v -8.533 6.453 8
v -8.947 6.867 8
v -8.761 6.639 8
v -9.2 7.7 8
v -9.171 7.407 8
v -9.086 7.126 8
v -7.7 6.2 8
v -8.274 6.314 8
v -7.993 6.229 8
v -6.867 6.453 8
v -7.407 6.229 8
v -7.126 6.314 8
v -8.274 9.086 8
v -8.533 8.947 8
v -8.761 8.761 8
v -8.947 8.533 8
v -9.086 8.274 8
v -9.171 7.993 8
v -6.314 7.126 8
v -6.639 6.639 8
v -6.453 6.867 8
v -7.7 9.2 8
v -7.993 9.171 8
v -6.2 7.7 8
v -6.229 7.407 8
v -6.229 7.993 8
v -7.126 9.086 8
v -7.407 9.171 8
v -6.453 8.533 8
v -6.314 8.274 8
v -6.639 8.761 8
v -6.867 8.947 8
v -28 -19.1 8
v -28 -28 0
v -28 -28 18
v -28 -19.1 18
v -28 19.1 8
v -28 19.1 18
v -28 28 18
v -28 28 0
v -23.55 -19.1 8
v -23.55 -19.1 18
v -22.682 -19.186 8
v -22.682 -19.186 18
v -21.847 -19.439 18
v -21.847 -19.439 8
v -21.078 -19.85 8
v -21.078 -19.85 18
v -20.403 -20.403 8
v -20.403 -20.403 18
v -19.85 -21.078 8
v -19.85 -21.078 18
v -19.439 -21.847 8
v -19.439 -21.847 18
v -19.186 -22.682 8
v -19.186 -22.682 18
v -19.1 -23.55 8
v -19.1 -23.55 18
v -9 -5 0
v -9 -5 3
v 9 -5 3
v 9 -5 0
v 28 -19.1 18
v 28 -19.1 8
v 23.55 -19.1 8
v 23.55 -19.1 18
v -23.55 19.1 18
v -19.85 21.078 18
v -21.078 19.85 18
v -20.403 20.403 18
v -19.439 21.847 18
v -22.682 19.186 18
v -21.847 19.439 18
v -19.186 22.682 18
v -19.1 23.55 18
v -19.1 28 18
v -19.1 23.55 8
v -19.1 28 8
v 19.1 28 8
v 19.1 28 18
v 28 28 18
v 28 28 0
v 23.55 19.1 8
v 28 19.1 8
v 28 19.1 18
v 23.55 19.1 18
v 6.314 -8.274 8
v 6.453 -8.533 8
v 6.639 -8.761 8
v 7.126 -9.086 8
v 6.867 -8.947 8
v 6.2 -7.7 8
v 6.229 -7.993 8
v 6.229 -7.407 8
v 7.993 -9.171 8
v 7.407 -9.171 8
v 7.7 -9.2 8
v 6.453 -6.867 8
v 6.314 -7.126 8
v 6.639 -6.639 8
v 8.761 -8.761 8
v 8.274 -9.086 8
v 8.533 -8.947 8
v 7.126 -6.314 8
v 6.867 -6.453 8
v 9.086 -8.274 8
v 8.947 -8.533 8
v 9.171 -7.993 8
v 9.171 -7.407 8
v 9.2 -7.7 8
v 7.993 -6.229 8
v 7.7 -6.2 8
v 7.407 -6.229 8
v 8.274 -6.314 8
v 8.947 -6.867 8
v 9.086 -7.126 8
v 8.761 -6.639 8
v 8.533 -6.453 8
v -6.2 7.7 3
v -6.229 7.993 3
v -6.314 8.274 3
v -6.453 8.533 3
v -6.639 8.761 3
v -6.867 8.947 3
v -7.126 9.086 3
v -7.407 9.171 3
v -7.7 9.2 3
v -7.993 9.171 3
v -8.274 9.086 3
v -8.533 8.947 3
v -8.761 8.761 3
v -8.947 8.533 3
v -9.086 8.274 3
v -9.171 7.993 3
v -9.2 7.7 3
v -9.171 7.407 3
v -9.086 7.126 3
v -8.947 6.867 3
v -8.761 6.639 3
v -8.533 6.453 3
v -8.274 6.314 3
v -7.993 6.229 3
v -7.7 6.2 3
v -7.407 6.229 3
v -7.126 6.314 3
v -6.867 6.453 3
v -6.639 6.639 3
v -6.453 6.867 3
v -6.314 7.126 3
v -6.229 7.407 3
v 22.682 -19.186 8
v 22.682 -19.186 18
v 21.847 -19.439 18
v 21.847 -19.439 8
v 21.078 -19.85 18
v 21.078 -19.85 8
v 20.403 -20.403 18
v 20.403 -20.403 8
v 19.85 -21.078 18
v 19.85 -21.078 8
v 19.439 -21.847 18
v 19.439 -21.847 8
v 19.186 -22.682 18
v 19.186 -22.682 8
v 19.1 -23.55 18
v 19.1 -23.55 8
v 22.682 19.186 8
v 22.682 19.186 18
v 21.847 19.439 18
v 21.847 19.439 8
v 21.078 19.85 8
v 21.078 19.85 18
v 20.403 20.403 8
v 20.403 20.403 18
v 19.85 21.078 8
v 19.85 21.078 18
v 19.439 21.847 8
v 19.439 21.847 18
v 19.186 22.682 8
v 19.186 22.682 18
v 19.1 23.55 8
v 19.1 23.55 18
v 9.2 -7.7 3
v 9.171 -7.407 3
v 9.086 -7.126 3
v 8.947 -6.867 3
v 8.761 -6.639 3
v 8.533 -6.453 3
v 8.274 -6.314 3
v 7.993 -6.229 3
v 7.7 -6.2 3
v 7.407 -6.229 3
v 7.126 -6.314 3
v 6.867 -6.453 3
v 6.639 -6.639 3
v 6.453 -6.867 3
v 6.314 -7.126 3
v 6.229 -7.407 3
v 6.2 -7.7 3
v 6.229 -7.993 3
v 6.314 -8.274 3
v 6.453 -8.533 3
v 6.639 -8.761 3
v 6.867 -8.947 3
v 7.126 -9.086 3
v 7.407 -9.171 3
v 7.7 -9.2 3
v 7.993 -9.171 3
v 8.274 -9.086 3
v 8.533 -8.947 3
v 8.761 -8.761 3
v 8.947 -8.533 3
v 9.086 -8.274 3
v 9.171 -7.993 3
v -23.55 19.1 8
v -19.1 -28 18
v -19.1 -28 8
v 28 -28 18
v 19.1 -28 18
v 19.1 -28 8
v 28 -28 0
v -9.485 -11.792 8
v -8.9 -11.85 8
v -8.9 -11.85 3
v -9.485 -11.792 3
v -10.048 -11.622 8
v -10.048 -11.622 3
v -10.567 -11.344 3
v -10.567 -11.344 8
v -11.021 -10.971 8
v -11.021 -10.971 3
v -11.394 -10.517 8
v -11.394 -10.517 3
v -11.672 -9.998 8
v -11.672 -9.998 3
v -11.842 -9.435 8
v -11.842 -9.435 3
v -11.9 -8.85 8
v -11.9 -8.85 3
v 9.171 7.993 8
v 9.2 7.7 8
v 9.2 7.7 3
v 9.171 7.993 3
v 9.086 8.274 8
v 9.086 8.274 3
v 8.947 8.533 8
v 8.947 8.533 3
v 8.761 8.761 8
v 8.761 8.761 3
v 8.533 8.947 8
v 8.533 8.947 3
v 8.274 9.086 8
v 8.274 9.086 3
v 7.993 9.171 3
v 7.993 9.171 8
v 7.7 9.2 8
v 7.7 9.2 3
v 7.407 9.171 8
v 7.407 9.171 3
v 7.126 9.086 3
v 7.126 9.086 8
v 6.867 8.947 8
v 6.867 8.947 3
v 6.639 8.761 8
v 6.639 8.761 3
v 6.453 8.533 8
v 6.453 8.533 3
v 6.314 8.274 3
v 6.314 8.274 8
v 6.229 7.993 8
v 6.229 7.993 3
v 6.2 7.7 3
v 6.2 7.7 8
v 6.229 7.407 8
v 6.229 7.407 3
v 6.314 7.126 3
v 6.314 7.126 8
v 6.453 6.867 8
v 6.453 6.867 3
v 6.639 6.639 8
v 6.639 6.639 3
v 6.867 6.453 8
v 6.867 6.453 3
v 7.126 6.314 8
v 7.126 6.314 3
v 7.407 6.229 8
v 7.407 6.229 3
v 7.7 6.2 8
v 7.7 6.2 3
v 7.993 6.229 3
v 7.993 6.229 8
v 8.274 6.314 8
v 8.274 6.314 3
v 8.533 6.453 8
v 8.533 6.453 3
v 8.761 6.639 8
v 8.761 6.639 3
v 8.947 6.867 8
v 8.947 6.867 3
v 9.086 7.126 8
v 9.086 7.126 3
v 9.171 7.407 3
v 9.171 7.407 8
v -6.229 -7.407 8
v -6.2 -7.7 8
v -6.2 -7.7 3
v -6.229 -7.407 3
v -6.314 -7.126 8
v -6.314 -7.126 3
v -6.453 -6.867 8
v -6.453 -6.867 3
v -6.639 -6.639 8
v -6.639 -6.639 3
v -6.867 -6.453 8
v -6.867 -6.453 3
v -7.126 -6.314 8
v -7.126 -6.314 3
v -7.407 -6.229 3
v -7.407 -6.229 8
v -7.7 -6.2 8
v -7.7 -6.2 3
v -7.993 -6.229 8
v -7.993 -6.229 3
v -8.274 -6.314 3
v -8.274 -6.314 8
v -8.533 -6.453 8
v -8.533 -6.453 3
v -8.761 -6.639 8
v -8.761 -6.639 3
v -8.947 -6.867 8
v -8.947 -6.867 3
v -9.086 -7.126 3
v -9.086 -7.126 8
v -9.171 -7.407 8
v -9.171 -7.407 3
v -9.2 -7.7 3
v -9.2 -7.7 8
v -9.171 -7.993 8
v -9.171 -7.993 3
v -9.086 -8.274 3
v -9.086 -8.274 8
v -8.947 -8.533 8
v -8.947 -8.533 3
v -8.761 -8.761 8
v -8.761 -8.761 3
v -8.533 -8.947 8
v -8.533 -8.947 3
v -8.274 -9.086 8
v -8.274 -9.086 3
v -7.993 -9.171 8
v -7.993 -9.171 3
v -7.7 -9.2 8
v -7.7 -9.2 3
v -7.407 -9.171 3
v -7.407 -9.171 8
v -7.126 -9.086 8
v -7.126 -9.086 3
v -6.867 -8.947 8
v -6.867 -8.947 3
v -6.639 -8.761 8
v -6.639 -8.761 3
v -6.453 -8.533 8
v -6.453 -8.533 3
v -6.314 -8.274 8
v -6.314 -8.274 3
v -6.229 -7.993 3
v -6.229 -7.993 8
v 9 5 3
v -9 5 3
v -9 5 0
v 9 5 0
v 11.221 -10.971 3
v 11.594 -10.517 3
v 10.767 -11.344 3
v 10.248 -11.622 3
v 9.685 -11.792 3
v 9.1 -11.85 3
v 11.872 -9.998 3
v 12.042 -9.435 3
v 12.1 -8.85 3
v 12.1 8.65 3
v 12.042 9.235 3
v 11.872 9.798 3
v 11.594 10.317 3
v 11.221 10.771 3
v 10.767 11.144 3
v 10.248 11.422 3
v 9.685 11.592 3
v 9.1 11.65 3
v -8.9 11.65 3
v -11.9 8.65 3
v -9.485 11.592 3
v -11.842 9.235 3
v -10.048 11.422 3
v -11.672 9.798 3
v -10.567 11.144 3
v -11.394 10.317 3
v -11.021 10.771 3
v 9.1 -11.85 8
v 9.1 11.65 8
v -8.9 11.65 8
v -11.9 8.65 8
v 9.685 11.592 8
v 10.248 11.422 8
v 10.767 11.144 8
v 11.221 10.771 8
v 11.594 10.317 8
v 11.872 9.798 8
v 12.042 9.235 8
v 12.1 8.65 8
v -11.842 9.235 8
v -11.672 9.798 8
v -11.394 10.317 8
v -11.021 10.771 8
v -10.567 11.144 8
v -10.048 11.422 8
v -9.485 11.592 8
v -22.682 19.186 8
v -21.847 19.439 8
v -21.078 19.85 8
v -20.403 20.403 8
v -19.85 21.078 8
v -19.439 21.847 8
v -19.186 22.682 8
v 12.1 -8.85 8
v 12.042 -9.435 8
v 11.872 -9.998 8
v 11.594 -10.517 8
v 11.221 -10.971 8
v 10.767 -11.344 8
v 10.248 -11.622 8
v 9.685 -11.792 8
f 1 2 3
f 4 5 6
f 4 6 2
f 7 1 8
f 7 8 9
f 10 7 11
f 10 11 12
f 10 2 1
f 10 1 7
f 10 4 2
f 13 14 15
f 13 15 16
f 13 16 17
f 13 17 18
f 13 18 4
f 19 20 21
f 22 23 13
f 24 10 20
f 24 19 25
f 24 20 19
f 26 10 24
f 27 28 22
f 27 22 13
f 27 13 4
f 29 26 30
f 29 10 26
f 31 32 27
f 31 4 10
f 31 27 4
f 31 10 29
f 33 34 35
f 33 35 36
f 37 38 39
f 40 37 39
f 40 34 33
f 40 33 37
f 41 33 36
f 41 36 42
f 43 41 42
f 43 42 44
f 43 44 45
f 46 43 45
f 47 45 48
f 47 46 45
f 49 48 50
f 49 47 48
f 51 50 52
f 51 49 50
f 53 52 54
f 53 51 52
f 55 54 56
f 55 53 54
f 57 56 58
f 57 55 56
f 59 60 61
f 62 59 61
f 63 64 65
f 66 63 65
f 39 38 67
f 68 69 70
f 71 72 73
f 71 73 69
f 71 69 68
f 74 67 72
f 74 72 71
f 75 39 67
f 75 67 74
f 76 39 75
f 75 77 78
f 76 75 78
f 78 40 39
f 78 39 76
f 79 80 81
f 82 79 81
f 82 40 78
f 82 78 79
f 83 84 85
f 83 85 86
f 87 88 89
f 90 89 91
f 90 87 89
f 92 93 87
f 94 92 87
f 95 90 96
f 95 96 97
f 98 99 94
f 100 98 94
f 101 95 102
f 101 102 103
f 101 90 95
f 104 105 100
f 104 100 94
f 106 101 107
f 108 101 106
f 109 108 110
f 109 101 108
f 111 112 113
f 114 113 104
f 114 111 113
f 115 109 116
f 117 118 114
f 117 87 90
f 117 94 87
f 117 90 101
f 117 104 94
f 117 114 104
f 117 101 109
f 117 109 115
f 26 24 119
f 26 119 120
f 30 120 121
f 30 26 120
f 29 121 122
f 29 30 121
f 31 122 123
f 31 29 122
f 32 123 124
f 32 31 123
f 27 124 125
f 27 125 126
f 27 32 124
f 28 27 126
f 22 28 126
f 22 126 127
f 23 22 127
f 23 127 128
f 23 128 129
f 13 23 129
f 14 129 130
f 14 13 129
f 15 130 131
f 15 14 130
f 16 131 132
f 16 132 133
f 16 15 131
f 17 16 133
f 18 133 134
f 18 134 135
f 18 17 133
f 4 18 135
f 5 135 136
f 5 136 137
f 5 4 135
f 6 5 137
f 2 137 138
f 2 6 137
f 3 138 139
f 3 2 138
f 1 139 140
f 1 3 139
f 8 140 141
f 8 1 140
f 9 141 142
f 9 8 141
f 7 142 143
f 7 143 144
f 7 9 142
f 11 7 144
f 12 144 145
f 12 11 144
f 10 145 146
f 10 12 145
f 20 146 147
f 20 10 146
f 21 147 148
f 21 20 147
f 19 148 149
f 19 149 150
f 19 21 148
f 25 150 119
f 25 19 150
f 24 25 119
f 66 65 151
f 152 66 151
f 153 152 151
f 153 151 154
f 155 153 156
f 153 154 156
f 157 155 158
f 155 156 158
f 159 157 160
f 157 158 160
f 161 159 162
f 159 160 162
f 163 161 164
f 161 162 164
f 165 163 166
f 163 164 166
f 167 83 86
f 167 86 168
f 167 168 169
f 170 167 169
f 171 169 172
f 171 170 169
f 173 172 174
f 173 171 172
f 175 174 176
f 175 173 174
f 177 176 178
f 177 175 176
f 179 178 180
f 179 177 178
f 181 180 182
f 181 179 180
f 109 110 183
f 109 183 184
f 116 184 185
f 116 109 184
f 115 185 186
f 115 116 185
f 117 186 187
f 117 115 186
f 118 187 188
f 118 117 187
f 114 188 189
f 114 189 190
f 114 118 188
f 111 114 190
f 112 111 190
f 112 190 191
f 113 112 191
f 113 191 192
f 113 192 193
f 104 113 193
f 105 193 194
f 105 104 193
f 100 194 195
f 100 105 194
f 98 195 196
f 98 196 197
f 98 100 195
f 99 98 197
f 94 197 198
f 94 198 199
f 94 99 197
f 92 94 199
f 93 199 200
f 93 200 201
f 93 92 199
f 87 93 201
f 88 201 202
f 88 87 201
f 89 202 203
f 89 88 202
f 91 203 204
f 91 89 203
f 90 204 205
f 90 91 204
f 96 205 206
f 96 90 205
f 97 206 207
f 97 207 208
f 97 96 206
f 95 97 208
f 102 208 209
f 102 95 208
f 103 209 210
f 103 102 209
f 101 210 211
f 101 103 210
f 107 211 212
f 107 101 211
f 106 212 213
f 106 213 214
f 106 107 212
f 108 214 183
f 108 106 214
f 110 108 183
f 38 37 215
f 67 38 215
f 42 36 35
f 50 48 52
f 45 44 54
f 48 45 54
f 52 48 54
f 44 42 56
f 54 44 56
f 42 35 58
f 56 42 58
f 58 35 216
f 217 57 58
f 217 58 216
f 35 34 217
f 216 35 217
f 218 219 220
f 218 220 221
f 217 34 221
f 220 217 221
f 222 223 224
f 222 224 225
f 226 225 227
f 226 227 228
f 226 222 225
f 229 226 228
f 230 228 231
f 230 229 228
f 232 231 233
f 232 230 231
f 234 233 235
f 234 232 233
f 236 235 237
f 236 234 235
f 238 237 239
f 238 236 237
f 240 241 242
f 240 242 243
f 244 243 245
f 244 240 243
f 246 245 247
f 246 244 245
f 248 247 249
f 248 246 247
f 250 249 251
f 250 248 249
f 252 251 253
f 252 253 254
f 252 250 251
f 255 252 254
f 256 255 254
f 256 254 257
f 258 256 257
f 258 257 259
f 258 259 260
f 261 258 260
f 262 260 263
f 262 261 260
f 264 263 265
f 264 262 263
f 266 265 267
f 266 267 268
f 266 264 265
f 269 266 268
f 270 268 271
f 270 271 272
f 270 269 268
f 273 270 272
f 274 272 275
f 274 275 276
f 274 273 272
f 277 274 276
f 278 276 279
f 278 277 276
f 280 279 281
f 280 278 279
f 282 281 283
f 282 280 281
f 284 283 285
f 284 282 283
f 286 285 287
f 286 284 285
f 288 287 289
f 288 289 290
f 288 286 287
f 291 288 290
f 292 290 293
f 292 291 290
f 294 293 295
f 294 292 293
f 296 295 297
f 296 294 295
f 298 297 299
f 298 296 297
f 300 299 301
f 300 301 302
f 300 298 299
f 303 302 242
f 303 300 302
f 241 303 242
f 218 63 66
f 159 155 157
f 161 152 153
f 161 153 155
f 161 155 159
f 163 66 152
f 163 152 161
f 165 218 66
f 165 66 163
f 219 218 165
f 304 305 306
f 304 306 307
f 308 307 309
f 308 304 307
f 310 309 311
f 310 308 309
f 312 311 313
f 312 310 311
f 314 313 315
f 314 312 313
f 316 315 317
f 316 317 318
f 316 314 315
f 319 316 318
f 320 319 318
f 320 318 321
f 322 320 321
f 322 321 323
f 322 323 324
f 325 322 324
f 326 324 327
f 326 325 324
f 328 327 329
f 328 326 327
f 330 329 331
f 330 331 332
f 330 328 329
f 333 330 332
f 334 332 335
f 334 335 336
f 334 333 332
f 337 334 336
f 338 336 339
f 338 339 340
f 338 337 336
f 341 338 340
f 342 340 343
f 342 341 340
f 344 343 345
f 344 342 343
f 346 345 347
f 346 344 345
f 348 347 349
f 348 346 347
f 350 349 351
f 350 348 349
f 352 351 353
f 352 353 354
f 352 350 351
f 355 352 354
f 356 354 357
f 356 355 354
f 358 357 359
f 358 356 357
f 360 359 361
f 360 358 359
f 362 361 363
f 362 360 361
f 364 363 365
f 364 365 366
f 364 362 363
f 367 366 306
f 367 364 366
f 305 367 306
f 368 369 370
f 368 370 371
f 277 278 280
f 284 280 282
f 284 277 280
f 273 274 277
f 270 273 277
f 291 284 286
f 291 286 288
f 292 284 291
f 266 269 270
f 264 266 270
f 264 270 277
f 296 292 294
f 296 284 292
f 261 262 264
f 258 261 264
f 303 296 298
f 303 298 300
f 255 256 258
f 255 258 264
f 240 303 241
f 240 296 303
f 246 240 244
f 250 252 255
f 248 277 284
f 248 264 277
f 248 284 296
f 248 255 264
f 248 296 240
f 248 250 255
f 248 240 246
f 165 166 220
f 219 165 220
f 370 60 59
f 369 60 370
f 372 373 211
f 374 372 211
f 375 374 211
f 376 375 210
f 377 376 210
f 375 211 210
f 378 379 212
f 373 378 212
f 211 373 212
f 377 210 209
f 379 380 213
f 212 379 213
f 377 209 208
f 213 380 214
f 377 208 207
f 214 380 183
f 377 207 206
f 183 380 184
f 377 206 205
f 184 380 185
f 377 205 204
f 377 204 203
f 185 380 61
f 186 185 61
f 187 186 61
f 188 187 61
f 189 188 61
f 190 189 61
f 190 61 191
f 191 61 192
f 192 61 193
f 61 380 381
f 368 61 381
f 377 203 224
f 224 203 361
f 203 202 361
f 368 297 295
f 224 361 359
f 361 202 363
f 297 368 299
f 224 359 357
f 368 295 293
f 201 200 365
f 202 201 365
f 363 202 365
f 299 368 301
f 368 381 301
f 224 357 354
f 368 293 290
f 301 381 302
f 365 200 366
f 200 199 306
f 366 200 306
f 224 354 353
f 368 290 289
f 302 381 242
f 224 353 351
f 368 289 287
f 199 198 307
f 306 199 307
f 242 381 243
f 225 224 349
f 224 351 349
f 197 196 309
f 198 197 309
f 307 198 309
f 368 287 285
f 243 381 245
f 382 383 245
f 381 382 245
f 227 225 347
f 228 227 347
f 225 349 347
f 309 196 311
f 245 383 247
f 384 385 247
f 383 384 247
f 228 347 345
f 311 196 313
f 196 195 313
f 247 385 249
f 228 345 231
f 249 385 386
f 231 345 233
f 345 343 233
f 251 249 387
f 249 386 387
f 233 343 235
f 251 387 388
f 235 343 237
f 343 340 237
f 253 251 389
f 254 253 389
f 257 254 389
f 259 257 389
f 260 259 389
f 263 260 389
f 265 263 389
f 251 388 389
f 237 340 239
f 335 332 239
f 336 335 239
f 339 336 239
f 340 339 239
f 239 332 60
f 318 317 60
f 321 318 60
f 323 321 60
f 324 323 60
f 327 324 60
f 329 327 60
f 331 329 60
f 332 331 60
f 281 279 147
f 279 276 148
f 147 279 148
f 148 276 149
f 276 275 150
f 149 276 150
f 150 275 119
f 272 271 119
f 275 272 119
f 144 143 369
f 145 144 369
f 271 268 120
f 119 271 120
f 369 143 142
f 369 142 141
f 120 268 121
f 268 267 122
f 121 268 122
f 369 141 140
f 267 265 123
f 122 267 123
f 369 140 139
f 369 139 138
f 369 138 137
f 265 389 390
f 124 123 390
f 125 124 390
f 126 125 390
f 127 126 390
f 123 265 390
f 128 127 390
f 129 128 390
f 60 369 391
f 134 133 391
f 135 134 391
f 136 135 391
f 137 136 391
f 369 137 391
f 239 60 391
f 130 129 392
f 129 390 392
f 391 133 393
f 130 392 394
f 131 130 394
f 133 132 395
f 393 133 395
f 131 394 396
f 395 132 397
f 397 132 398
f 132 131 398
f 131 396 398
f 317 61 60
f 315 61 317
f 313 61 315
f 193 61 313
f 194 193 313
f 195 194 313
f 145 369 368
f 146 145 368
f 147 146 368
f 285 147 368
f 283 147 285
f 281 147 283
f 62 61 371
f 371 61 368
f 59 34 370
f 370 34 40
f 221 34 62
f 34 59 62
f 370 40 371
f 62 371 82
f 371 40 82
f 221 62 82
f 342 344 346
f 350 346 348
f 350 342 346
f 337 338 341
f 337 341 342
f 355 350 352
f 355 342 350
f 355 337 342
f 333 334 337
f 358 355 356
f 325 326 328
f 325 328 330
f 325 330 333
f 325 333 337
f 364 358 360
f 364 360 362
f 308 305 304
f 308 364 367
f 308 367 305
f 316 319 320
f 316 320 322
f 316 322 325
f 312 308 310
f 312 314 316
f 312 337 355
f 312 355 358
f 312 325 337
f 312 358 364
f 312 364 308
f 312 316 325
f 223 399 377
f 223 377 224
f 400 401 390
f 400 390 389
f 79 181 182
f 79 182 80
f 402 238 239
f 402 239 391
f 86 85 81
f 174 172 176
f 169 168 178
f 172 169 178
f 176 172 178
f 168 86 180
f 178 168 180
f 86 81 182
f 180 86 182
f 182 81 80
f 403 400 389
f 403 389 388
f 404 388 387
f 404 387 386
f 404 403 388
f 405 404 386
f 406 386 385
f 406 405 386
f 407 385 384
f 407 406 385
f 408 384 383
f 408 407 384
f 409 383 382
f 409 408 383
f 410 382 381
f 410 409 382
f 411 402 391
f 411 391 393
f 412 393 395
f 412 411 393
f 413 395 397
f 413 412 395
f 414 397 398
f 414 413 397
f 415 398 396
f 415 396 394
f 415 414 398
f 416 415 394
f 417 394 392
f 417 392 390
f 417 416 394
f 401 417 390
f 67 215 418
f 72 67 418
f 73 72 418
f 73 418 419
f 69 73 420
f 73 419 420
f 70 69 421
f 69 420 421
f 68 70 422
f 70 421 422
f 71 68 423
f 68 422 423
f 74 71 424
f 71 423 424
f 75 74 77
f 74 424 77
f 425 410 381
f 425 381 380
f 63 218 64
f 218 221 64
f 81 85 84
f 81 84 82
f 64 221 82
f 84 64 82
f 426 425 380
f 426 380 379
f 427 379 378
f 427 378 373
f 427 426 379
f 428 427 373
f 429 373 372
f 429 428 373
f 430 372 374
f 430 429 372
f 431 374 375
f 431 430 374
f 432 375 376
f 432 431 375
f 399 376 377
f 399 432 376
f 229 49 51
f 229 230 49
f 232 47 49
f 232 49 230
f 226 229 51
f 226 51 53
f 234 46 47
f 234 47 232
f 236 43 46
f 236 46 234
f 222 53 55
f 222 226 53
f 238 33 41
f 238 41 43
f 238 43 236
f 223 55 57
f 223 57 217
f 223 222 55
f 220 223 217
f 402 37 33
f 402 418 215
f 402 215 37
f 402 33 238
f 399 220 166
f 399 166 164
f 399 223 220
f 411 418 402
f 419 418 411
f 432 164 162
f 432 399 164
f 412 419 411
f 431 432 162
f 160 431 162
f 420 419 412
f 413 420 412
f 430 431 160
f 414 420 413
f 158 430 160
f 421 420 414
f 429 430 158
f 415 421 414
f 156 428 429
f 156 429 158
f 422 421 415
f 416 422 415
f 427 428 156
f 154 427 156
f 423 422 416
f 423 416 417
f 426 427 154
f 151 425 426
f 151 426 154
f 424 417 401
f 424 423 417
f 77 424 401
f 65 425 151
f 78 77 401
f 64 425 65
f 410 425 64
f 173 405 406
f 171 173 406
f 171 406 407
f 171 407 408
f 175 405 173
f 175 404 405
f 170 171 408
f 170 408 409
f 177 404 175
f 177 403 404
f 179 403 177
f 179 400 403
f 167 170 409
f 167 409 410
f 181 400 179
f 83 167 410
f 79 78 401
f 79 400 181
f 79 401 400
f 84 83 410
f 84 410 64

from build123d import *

# Parameters (mm, degrees)
ESBO_O1_W                = 56
ESBO_O1_H                = 56
RESSALTO_EXTRUS_O1_DEPTH = 8
RESSALTO_EXTRUS_O2_DEPTH = 10
ESPELHAR2_COPY_1_DEPTH   = 10
ESBO_O3_R                = 1.5
CORTE_EXTRUS_O1_DEPTH    = 5
ESBO_O4_W                = 18
ESBO_O4_H                = 10
CORTE_EXTRUS_O2_DEPTH    = 12


with BuildPart() as part:
    # Esboço1 → Ressalto-extrusão1 (new body)
    with BuildSketch(Plane.XY):
        Rectangle(ESBO_O1_W, ESBO_O1_H)
    extrude(amount=RESSALTO_EXTRUS_O1_DEPTH)

    # Esboço2 → Ressalto-extrusão2 (add)
    with BuildSketch(Plane.XY.offset(8)):
        with BuildLine():
            Line((-19.1, 23.55), (-19.1, 28))
            Line((-19.1, 28), (-28, 28))
            Line((-28, 28), (-28, 19.1))
            Line((-28, 19.1), (-23.55, 19.1))
            ThreePointArc((-23.55, 19.1), (-20.403374824, 20.403374824), (-19.1, 23.55))
        make_face()
    ressalto_extrus_o2 = extrude(amount=RESSALTO_EXTRUS_O2_DEPTH)

    # Espelhar1: Ressalto-extrusão2 across plane
    add(ressalto_extrus_o2.mirror(Plane(origin=(0, 0, 0), x_dir=(0, 0, 1), z_dir=(1, 0, 0))))

    # Espelhar2: Ressalto-extrusão2 across plane
    add(ressalto_extrus_o2.mirror(Plane.ZX))

    # Espelhar2 copy 1 sketch → Espelhar2 copy 1 (add)
    with BuildSketch(Plane(origin=(0, 0, 8), x_dir=(-1, 0, 0), z_dir=(0, 0, 1))):
        with BuildLine():
            Line((-19.1, 23.55), (-19.1, 28))
            Line((-19.1, 28), (-28, 28))
            Line((-28, 28), (-28, 19.1))
            Line((-28, 19.1), (-23.55, 19.1))
            ThreePointArc((-23.55, 19.1), (-20.403374824, 20.403374824), (-19.1, 23.55))
        make_face()
    extrude(amount=ESPELHAR2_COPY_1_DEPTH)

    # Esboço3 → Corte-extrusão1 (cut)
    with BuildSketch(Plane.XY.offset(8)):
        with BuildLine():
            Line((9.1, -11.85), (-8.9, -11.85))
            ThreePointArc((-8.9, -11.85), (-11.021320344, -10.971320344), (-11.9, -8.85))
            Line((-11.9, -8.85), (-11.9, 8.65))
            ThreePointArc((-11.9, 8.65), (-11.021320344, 10.771320344), (-8.9, 11.65))
            Line((-8.9, 11.65), (9.1, 11.65))
            ThreePointArc((9.1, 11.65), (11.221320344, 10.771320344), (12.1, 8.65))
            Line((12.1, 8.65), (12.1, -8.85))
            ThreePointArc((12.1, -8.85), (11.221320344, -10.971320344), (9.1, -11.85))
        make_face()
        with Locations((-7.7, 7.7)):
            Circle(ESBO_O3_R, mode=Mode.SUBTRACT)
        with Locations((7.7, 7.7)):
            Circle(ESBO_O3_R, mode=Mode.SUBTRACT)
        with Locations((7.7, -7.7)):
            Circle(ESBO_O3_R, mode=Mode.SUBTRACT)
        with Locations((-7.7, -7.7)):
            Circle(ESBO_O3_R, mode=Mode.SUBTRACT)
    extrude(amount=-CORTE_EXTRUS_O1_DEPTH, mode=Mode.SUBTRACT)

    # Esboço4 → Corte-extrusão2 (cut)
    with BuildSketch(Plane.XY.offset(3)):
        Rectangle(ESBO_O4_W, ESBO_O4_H)
    extrude(amount=-CORTE_EXTRUS_O2_DEPTH, mode=Mode.SUBTRACT)


solid = part.part
